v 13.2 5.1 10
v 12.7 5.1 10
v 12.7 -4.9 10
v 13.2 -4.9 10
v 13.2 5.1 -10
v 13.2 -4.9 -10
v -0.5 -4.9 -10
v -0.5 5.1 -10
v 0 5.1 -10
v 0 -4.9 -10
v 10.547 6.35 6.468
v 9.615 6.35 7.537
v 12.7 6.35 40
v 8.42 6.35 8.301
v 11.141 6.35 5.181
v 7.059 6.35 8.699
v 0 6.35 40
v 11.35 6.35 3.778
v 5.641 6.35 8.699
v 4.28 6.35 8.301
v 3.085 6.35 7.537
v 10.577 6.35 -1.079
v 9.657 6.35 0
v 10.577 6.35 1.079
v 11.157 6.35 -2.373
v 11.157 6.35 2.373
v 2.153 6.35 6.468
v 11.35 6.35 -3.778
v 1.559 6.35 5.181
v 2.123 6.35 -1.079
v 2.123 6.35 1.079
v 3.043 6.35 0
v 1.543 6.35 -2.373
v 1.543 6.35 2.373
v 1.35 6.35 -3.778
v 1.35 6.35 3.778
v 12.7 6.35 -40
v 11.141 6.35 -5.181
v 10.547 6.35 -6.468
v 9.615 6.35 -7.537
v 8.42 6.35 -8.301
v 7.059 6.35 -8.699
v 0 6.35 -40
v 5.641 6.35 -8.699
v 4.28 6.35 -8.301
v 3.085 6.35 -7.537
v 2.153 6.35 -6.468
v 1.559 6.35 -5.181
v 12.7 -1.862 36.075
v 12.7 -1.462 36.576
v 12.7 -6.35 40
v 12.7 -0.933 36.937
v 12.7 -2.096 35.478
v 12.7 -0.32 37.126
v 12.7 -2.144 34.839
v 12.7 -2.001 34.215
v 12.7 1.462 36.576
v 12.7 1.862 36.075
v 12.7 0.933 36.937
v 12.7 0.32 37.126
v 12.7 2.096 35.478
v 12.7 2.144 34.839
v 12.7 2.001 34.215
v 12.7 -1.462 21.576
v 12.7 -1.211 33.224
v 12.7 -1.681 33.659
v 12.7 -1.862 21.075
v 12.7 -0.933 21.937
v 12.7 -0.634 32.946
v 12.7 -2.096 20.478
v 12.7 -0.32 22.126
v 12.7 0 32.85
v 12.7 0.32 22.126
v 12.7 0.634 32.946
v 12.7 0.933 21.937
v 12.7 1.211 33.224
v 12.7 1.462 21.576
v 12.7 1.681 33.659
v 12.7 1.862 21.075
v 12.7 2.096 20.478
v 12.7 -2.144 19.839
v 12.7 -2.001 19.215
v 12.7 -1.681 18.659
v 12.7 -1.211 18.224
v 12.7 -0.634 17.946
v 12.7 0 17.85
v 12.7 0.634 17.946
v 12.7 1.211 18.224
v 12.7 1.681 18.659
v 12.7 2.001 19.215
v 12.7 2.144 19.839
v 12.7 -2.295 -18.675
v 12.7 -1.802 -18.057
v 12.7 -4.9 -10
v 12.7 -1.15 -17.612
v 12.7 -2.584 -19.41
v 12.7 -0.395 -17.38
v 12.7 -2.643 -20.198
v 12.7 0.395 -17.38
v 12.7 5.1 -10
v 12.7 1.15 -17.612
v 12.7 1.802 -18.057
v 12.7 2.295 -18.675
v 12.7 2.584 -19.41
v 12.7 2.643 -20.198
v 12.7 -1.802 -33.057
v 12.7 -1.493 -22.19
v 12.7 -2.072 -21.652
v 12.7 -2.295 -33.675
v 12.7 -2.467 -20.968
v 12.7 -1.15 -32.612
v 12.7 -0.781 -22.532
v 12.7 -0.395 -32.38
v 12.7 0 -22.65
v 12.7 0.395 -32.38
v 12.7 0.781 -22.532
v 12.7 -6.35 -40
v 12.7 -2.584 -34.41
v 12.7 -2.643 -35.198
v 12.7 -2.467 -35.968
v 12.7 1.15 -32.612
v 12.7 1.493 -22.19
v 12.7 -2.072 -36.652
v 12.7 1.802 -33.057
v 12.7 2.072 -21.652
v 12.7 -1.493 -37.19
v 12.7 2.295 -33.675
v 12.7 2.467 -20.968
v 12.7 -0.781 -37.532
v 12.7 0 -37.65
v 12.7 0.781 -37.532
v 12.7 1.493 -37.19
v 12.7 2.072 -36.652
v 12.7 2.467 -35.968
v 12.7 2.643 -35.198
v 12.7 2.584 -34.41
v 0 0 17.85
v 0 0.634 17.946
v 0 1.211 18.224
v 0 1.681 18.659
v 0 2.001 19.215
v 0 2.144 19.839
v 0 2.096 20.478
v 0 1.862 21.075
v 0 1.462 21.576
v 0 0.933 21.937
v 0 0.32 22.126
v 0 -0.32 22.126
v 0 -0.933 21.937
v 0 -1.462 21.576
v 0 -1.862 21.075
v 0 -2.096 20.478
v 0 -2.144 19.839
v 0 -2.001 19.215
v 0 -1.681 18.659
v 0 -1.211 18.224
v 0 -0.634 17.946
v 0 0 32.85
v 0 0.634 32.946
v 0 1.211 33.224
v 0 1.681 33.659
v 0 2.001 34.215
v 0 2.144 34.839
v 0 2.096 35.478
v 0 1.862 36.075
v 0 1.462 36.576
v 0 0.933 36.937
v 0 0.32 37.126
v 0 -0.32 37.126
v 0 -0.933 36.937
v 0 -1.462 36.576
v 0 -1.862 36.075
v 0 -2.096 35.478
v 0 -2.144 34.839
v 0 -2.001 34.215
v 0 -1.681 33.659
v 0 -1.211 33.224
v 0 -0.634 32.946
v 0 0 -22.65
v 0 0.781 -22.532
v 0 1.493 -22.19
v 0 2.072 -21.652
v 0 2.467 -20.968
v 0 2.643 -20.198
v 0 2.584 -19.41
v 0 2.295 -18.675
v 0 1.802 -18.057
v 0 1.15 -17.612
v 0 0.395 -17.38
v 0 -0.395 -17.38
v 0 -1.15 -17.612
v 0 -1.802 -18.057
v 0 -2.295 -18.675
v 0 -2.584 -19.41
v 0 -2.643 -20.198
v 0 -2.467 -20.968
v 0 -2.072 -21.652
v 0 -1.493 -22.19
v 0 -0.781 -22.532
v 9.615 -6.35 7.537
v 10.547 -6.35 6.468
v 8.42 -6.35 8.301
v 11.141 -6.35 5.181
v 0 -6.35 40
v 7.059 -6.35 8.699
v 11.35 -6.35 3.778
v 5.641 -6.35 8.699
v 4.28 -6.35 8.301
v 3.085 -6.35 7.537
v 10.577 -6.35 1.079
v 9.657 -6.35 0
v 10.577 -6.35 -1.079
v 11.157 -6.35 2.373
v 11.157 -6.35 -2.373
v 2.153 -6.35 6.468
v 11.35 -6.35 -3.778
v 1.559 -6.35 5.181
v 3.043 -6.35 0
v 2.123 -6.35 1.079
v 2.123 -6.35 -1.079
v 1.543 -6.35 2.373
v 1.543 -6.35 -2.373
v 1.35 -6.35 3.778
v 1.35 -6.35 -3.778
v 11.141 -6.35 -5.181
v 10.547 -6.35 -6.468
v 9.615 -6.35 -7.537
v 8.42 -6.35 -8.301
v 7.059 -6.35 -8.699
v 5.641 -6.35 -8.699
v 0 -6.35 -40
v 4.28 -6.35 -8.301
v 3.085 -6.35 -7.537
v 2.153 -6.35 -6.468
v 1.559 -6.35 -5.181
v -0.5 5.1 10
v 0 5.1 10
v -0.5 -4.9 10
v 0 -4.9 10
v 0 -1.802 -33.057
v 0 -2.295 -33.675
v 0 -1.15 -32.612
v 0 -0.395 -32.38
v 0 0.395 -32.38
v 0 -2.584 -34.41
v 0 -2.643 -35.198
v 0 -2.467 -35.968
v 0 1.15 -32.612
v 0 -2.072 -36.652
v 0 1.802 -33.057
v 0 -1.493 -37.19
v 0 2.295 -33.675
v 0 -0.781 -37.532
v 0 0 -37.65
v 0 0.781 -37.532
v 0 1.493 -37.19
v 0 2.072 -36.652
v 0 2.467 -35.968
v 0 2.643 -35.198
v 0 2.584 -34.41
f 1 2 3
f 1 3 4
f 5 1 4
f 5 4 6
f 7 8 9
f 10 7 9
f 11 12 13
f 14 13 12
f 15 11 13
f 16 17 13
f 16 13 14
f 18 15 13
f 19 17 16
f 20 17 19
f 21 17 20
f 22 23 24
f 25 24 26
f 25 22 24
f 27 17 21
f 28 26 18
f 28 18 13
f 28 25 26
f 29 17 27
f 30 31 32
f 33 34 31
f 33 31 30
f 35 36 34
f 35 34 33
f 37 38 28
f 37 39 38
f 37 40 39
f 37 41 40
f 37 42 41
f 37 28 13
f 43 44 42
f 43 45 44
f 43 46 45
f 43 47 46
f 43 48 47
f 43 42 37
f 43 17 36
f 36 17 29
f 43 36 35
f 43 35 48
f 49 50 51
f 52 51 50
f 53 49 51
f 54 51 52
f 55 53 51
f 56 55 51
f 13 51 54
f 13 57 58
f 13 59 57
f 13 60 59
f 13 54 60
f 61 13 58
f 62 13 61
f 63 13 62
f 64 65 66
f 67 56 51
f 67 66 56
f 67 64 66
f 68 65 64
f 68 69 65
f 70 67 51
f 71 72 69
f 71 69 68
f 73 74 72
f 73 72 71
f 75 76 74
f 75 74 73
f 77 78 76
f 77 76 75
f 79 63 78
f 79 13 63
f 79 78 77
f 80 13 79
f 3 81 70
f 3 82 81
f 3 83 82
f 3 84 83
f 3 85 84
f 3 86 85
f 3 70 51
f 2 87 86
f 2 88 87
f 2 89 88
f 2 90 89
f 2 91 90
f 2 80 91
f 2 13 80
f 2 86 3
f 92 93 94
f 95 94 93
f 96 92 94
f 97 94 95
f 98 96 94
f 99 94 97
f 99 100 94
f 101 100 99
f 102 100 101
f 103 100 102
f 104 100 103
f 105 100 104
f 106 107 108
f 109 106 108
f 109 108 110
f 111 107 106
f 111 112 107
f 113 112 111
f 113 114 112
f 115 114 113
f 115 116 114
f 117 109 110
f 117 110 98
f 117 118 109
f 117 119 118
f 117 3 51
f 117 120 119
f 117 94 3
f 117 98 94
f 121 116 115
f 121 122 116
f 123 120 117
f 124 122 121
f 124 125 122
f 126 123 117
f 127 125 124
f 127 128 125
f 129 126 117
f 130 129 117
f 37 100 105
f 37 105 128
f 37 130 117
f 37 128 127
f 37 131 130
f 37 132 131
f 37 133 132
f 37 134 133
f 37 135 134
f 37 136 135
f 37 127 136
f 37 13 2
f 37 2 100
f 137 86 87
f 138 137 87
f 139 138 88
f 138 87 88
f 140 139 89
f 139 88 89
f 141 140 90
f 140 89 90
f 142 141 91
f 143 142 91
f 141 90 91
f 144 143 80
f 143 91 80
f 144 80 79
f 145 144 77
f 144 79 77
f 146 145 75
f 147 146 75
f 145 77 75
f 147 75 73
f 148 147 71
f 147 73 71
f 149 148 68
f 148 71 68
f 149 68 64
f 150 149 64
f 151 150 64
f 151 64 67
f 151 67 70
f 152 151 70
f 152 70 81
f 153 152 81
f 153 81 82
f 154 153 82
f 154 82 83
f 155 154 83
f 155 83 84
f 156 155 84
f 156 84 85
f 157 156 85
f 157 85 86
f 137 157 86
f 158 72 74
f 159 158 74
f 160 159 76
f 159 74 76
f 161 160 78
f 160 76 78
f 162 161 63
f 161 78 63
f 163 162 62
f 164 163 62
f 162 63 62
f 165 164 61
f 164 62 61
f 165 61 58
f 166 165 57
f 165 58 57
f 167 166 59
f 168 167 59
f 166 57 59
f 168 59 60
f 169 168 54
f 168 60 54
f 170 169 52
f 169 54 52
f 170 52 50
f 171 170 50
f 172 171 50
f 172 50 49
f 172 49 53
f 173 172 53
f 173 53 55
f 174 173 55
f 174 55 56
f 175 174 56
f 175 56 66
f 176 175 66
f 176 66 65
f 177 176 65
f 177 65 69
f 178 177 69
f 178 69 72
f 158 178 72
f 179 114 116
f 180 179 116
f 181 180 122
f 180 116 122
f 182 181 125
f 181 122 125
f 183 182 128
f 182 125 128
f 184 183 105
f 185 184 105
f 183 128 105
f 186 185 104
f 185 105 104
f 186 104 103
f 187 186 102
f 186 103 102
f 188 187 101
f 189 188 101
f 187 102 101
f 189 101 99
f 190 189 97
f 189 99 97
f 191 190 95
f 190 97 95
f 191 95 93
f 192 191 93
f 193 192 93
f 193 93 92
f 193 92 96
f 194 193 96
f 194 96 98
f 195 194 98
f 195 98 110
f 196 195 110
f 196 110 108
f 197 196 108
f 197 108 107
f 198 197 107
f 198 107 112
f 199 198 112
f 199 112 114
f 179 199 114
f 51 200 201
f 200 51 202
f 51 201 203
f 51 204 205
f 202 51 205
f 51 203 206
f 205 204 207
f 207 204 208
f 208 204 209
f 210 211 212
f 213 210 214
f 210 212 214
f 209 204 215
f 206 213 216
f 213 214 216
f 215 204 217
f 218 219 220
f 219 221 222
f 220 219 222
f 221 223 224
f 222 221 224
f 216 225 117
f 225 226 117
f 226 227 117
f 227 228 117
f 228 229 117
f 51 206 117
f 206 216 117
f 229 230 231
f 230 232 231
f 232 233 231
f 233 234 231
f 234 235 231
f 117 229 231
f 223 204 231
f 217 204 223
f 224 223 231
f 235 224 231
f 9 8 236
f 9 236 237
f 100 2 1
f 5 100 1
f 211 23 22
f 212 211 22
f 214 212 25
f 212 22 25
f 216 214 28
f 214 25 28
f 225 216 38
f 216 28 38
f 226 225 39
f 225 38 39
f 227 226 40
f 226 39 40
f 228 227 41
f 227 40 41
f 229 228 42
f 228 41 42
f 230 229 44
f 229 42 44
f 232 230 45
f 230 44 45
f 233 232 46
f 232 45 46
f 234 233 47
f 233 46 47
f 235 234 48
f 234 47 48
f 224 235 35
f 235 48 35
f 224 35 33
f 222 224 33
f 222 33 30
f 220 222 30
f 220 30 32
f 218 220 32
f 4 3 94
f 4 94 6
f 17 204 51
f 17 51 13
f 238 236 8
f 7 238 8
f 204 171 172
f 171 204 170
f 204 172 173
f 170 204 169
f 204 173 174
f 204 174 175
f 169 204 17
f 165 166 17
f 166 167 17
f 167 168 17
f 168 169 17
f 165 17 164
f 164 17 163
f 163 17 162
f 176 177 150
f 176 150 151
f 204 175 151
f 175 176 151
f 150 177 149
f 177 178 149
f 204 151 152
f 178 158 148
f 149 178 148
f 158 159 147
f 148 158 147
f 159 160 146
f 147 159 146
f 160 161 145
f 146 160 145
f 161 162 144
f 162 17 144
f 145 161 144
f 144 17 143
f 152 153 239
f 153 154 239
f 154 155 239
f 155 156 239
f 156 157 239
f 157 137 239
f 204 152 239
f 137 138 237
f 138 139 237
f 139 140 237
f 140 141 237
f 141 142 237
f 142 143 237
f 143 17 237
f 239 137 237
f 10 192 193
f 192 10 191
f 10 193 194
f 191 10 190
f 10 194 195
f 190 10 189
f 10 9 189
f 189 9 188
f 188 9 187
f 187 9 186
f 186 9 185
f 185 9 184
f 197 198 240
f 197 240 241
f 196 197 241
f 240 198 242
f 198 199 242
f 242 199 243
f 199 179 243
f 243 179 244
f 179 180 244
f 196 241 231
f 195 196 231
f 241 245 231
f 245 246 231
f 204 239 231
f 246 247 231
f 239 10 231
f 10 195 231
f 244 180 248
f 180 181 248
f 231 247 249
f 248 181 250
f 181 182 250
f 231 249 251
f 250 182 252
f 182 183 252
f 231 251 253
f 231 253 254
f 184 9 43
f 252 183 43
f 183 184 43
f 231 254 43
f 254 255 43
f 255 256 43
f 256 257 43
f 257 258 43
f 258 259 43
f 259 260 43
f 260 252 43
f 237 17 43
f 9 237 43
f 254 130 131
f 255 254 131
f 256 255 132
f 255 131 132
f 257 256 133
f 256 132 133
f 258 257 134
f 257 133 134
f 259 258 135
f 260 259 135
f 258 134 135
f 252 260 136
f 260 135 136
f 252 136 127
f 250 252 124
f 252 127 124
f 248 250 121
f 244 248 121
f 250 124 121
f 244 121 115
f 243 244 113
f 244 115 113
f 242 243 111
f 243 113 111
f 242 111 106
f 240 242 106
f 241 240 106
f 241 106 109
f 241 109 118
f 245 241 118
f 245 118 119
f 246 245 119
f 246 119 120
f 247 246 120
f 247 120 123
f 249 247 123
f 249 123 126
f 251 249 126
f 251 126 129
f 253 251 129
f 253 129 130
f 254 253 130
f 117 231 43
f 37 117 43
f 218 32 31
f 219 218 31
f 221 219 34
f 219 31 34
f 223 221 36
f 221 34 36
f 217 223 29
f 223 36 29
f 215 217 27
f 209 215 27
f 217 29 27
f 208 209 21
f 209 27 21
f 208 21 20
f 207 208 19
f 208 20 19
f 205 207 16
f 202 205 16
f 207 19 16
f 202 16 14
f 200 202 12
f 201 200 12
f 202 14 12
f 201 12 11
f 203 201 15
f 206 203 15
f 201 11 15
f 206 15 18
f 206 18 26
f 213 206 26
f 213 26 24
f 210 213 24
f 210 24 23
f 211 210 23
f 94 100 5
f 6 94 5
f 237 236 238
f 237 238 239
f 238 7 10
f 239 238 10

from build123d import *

# Parameters (mm, degrees)
SKETCH1_W           = 80
SKETCH1_H           = 12.7
BOSS_EXTRUDE1_DEPTH = 12.7
SKETCH2_R           = 5
CUT_EXTRUDE1_DEPTH  = 13.7
SKETCH3_R           = 2.15
SKETCH3_R_2         = 2.65
CUT_EXTRUDE2_DEPTH  = 13.7
BOSS_EXTRUDE2_START = -1.25
SKETCH4_W           = 0.5
SKETCH4_H           = 20
BOSS_EXTRUDE2_DEPTH = 10


with BuildPart() as part:
    # Sketch1 → Boss-Extrude1 (new body)
    with BuildSketch(Plane(origin=(0, 0, 0), x_dir=(0, 0, -1), z_dir=(1, 0, 0))):
        Rectangle(SKETCH1_W, SKETCH1_H)
    extrude(amount=BOSS_EXTRUDE1_DEPTH)

    # Sketch2 → Cut-Extrude1 (cut, through all)
    with BuildSketch(Plane(origin=(0, 6.35, 0), x_dir=(1, 0, 0), z_dir=(0, 1, 0))):
        with Locations((6.35, -3.75)):
            Circle(SKETCH2_R)
        with Locations((6.35, 3.75)):
            Circle(SKETCH2_R)
    extrude(amount=-CUT_EXTRUDE1_DEPTH, mode=Mode.SUBTRACT)

    # Sketch3 → Cut-Extrude2 (cut, through all)
    with BuildSketch(Plane(origin=(12.7, 0, 0), x_dir=(0, 0, -1), z_dir=(1, 0, 0))):
        with Locations((-35, 0)):
            Circle(SKETCH3_R)
        with Locations((-20, 0)):
            Circle(SKETCH3_R)
        with Locations((20, 0)):
            Circle(SKETCH3_R_2)
        with Locations((35, 0)):
            Circle(SKETCH3_R_2)
    extrude(amount=-CUT_EXTRUDE2_DEPTH, mode=Mode.SUBTRACT)

    # Sketch4 → Boss-Extrude2 (add)
    with BuildSketch(Plane(origin=(0, 6.35, 0), x_dir=(1, 0, 0), z_dir=(0, 1, 0)).offset(BOSS_EXTRUDE2_START)):
        with Locations((-0.25, 0)):
            Rectangle(SKETCH4_W, SKETCH4_H)
        with Locations((12.95, 0)):
            Rectangle(SKETCH4_W, SKETCH4_H)
    extrude(amount=-BOSS_EXTRUDE2_DEPTH)


solid = part.part
